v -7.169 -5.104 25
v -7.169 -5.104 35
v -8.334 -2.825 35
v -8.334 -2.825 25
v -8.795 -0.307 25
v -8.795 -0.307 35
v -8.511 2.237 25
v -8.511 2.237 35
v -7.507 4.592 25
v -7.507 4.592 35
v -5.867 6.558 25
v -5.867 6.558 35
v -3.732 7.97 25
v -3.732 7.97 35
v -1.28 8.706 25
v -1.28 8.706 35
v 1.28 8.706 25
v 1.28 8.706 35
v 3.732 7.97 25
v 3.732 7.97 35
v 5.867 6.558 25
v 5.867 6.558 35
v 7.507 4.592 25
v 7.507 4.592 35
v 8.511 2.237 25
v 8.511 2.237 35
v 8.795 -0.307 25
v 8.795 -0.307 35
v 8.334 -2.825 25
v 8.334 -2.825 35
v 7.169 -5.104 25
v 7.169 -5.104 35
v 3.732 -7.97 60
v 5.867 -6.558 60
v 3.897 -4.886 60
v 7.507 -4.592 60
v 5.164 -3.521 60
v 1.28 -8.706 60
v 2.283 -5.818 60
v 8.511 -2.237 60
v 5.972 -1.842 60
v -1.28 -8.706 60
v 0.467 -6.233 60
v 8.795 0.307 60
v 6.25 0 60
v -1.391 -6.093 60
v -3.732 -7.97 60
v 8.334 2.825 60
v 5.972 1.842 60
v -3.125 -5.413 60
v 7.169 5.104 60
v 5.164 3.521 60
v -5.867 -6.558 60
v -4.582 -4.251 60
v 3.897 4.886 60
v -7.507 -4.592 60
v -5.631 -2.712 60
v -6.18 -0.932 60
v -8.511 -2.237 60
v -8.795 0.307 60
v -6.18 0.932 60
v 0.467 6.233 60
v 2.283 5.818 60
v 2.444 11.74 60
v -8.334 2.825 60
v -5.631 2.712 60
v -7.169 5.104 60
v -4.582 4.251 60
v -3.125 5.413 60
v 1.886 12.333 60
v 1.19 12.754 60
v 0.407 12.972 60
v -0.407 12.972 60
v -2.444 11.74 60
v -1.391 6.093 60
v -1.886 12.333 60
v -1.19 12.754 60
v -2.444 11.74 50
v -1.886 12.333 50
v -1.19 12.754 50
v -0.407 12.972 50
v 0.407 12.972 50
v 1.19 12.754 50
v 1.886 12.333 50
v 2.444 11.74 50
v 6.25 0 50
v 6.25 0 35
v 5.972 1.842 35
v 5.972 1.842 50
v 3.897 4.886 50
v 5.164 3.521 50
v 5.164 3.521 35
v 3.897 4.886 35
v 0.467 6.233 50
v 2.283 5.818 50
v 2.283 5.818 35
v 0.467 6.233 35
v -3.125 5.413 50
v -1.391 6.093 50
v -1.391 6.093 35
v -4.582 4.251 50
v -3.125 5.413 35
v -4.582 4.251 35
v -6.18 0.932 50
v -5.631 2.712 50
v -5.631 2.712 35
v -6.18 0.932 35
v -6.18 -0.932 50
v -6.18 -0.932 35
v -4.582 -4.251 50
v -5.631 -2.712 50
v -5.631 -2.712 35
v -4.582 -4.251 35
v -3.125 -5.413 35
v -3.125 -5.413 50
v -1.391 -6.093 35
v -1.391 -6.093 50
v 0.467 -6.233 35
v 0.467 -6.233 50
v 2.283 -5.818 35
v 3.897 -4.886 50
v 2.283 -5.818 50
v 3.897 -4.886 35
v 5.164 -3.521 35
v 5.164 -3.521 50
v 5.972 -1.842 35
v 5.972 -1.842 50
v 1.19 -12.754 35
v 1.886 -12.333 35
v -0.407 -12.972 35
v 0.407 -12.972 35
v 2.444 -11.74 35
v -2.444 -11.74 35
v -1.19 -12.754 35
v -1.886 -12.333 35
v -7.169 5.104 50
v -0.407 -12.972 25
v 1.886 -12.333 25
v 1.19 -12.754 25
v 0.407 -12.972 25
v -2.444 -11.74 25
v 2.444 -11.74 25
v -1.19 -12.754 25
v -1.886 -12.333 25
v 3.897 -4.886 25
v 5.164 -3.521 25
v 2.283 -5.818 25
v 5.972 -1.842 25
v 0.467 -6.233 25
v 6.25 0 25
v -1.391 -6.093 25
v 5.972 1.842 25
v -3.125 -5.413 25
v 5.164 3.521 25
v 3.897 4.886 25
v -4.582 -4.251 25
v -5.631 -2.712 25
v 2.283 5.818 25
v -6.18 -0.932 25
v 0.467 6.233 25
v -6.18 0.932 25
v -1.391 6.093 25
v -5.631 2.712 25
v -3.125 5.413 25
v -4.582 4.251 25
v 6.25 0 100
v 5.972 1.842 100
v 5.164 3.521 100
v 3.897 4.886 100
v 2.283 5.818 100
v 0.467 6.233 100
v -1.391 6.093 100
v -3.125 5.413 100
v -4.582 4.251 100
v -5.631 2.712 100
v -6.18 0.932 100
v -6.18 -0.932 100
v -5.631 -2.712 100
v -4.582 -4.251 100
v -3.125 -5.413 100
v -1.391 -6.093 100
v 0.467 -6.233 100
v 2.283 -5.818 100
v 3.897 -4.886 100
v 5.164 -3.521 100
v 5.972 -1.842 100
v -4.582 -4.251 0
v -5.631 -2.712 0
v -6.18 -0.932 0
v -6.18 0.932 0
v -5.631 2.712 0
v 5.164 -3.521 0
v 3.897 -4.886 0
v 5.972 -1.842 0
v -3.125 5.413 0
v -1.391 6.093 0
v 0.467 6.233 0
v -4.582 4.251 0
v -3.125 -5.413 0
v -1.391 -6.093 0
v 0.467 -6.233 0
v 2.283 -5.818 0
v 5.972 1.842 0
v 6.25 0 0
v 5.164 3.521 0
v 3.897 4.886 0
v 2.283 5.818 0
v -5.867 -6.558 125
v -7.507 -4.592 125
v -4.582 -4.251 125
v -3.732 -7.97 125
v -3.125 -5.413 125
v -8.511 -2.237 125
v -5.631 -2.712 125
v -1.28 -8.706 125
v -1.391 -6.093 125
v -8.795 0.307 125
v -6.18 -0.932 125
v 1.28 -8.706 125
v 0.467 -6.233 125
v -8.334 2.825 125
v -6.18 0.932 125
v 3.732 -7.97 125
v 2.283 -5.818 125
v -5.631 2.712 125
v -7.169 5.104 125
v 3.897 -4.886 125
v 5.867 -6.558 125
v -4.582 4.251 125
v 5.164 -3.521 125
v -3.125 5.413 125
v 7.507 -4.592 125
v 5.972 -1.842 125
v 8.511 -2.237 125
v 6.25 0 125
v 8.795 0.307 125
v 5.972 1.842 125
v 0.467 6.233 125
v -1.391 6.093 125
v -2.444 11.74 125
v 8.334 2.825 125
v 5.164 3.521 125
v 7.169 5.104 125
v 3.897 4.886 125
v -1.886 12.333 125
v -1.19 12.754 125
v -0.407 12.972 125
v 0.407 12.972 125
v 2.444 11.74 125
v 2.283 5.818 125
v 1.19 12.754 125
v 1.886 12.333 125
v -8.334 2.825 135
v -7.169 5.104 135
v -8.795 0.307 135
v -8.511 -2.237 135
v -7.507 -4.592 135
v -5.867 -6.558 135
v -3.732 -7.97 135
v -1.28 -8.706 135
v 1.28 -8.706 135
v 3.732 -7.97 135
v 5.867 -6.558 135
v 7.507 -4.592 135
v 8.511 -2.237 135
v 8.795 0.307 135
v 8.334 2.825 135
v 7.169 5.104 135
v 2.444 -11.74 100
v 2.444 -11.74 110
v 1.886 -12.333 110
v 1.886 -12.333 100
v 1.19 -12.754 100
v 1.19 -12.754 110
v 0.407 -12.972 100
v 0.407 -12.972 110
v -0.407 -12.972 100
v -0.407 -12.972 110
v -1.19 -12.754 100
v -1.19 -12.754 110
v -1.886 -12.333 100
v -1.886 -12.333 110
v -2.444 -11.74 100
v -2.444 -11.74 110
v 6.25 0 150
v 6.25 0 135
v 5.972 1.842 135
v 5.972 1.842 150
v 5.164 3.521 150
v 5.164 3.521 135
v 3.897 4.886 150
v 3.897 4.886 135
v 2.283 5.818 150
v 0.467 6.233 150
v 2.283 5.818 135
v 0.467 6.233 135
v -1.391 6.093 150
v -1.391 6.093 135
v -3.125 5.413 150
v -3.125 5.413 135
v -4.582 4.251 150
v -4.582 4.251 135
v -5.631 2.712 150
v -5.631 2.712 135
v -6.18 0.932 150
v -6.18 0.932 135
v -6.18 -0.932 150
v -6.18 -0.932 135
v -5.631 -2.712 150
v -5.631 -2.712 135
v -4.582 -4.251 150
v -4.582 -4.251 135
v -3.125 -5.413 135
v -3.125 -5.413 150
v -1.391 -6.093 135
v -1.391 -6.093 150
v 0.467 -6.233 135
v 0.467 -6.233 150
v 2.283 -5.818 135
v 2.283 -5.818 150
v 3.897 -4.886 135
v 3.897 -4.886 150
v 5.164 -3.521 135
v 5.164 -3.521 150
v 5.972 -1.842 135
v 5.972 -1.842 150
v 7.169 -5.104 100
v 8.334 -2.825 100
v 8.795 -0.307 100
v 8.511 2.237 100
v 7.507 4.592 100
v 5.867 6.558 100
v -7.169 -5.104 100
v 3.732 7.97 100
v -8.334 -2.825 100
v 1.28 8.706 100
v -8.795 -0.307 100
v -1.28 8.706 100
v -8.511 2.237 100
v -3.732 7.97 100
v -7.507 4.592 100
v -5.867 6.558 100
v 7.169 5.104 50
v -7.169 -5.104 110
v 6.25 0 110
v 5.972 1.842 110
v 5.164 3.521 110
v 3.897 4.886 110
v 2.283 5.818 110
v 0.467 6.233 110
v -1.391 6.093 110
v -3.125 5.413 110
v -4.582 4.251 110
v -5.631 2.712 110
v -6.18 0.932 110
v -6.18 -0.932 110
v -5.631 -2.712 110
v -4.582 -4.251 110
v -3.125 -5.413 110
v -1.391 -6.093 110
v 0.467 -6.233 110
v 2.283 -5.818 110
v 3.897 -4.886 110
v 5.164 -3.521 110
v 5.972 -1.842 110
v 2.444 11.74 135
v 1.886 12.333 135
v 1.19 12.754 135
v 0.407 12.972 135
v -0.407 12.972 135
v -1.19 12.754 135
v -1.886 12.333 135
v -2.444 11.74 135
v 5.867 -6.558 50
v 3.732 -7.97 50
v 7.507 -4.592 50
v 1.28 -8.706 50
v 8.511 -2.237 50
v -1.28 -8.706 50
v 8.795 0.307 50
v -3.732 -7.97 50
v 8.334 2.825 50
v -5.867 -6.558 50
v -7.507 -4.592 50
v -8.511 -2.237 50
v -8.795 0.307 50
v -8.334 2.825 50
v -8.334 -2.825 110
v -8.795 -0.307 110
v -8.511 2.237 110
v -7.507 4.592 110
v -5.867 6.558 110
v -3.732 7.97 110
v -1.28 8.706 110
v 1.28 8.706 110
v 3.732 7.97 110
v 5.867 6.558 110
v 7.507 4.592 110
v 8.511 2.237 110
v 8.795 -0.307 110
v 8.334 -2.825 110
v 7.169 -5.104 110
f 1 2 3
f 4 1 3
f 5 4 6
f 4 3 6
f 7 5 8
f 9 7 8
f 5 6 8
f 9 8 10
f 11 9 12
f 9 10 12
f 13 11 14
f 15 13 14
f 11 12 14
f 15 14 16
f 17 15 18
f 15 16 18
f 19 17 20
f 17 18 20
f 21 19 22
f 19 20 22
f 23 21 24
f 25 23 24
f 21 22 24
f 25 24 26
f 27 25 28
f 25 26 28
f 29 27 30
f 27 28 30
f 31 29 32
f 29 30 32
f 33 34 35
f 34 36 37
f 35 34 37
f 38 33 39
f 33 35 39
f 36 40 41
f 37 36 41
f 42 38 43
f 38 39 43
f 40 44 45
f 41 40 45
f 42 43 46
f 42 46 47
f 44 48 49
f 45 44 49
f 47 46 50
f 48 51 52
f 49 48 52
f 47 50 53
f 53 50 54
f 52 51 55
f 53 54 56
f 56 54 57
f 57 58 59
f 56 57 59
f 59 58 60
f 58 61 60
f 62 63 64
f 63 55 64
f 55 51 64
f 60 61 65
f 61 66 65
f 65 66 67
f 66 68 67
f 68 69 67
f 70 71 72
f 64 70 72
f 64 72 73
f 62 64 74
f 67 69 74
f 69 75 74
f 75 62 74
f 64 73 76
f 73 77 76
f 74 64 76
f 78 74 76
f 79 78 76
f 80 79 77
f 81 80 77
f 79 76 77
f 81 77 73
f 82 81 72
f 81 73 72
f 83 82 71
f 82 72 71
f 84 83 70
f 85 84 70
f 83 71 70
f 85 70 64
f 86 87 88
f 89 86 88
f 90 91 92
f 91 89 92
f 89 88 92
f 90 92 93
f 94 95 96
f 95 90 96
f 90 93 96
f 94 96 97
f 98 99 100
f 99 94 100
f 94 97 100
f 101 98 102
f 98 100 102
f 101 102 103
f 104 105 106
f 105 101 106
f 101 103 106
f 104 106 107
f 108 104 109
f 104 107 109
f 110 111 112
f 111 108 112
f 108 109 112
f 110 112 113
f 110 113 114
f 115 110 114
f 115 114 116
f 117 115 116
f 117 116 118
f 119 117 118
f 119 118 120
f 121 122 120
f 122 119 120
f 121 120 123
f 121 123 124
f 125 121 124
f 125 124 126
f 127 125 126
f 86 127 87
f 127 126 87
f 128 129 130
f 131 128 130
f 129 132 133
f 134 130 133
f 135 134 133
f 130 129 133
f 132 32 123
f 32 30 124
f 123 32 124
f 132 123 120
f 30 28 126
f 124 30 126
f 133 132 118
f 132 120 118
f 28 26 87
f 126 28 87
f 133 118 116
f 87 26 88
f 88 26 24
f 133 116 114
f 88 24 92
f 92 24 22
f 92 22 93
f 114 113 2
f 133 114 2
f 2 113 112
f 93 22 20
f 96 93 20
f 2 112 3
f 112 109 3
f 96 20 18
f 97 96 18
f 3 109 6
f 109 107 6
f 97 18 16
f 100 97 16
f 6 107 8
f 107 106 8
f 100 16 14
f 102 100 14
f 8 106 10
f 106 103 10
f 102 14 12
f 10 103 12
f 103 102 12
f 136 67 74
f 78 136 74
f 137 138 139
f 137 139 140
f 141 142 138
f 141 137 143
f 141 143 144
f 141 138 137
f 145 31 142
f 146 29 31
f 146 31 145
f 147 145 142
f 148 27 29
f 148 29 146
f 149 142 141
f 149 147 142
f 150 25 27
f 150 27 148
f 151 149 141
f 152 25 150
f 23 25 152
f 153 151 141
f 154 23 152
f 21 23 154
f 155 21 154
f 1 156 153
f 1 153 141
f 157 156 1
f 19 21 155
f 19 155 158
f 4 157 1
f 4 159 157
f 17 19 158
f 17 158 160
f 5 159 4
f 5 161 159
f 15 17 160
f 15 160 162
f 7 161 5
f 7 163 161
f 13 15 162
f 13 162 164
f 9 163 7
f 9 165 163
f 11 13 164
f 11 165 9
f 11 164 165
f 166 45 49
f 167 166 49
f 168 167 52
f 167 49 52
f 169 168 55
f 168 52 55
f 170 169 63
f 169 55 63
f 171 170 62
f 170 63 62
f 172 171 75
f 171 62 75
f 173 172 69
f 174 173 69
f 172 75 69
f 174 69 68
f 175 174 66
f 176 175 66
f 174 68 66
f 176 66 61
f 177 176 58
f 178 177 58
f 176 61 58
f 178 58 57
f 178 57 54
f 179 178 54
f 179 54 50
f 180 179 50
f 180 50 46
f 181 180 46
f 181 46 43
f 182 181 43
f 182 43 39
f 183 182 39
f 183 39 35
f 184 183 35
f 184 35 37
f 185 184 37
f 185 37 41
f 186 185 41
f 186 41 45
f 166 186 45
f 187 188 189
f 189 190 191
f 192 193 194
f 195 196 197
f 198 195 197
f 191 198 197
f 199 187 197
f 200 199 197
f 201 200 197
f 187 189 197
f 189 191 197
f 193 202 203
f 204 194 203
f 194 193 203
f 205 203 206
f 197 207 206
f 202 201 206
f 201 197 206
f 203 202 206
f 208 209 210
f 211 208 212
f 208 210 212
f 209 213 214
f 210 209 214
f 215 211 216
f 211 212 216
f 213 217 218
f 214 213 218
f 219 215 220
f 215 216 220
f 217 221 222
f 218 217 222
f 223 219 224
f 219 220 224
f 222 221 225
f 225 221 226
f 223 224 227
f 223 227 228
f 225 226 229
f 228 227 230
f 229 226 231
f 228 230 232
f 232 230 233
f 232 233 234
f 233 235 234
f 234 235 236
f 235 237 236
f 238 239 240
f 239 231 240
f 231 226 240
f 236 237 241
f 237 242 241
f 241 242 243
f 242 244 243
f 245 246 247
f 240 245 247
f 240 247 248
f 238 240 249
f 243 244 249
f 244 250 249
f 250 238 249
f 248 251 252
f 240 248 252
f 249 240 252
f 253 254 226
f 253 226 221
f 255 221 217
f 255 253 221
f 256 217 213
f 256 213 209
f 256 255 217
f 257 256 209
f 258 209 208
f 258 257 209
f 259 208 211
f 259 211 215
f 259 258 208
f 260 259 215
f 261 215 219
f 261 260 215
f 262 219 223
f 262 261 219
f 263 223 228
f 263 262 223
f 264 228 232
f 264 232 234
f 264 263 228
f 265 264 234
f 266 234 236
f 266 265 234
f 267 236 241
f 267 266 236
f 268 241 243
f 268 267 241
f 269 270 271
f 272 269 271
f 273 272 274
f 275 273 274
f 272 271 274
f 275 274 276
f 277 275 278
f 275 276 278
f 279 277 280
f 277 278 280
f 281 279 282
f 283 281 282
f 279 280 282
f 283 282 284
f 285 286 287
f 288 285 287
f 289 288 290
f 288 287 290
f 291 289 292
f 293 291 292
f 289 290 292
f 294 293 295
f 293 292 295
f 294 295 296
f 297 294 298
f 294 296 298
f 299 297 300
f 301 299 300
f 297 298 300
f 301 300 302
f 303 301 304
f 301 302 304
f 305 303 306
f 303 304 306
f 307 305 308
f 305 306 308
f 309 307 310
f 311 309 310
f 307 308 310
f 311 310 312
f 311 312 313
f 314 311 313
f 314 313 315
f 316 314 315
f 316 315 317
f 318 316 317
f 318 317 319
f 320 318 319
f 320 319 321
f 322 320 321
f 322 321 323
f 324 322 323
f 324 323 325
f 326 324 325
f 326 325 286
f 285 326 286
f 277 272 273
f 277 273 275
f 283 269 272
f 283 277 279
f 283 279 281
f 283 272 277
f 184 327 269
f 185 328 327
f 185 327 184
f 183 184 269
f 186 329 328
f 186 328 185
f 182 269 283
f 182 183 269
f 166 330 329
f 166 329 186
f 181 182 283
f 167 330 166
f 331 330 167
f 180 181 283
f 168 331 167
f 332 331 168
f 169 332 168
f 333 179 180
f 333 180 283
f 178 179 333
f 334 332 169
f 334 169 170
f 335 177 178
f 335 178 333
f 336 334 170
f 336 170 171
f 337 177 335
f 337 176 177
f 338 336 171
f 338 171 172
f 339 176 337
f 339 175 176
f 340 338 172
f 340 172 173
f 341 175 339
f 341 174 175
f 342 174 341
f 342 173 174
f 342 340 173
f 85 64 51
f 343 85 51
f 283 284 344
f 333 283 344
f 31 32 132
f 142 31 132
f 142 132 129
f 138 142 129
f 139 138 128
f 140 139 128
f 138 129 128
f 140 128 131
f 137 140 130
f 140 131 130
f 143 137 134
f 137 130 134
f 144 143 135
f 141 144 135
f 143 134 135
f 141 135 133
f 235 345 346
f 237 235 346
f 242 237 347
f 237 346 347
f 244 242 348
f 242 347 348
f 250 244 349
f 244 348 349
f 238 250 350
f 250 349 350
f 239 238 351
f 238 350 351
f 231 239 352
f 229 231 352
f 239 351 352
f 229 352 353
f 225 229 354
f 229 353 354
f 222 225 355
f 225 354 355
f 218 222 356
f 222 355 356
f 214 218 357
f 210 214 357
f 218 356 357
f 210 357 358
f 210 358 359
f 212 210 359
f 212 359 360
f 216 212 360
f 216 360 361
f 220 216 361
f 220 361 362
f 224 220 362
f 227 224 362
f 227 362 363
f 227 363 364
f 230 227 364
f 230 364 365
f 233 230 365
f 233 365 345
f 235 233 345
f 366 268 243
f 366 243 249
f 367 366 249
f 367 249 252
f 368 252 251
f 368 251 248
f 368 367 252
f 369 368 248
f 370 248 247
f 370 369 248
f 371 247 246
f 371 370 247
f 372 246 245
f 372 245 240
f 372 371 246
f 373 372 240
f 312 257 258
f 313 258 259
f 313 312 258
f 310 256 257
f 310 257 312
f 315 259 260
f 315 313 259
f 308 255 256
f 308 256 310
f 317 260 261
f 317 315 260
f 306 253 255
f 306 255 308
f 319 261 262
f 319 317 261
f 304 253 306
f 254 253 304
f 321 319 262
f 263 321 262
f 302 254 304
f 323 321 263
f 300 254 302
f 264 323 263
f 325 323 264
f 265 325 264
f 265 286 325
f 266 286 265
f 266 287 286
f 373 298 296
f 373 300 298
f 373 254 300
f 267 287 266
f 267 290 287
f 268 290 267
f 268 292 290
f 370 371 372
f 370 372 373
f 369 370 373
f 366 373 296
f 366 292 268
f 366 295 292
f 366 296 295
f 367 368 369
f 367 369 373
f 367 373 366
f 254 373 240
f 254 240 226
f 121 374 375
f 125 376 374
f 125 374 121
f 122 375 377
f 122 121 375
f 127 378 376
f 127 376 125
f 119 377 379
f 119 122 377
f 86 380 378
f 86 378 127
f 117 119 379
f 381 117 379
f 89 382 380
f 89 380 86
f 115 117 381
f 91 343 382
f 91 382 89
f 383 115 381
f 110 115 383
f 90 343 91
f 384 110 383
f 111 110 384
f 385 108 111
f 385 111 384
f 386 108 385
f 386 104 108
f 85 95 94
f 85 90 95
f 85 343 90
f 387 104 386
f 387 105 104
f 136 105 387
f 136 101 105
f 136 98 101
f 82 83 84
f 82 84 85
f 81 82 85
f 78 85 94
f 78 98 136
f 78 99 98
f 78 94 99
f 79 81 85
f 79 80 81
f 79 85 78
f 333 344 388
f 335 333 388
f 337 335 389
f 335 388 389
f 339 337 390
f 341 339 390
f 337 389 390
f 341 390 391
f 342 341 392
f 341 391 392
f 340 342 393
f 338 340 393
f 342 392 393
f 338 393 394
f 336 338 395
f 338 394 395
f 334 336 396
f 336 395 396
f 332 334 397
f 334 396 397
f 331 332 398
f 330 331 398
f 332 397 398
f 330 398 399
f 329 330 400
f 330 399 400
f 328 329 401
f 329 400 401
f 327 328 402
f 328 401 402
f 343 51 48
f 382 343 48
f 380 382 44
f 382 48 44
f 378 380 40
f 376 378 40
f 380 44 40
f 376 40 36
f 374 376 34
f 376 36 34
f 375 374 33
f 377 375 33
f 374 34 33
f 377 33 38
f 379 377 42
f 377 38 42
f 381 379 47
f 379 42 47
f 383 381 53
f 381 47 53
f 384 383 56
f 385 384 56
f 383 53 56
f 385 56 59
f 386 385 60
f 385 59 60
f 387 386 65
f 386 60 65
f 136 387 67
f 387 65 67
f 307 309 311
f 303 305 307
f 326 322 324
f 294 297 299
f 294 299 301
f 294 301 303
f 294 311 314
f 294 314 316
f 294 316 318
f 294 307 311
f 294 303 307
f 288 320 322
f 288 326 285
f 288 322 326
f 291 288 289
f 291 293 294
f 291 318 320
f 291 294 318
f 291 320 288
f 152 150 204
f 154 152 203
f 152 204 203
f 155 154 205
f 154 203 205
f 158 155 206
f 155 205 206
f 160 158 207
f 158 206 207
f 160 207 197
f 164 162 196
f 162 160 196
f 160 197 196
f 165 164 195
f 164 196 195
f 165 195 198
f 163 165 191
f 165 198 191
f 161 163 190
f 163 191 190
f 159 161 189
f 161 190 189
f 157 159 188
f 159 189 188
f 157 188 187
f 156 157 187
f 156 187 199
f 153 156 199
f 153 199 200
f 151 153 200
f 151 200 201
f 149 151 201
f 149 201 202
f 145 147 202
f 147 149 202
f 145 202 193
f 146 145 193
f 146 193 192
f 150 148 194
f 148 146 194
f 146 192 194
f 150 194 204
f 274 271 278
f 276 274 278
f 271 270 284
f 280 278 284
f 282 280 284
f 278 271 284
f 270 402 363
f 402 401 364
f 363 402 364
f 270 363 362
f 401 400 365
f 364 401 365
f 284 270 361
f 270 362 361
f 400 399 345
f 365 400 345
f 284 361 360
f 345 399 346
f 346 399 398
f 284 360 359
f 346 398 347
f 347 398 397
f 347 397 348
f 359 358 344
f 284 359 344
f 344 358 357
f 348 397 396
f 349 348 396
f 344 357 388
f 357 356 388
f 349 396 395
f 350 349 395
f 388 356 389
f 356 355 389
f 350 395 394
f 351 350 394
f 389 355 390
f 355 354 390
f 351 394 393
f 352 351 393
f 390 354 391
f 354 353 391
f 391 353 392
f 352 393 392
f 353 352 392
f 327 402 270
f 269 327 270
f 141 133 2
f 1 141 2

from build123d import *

# Parameters (mm, degrees)
SKETCH1_R           = 6.25
BOSS_EXTRUDE1_DEPTH = 150
SKETCH2_R           = 6.25
BOSS_EXTRUDE2_DEPTH = 10
SKETCH3_R           = 6.25
BOSS_EXTRUDE3_DEPTH = 10
BOSS_EXTRUDE4_DEPTH = 10
BOSS_EXTRUDE5_DEPTH = 10


with BuildPart() as part:
    # Sketch1 → Boss-Extrude1 (new body)
    with BuildSketch(Plane.XY):
        Circle(SKETCH1_R)
    extrude(amount=BOSS_EXTRUDE1_DEPTH)

    # Sketch2 → Boss-Extrude2 (add)
    with BuildSketch(Plane.XY.offset(135)):
        with BuildLine():
            Line((-2.443849423, 11.74), (-7.168624973, 5.104))
            ThreePointArc((-7.168624973, 5.104), (0, -8.8), (7.168624973, 5.104))
            Line((7.168624973, 5.104), (2.443849423, 11.74))
            ThreePointArc((2.443849423, 11.74), (0, 13), (-2.443849423, 11.74))
        make_face()
        Circle(SKETCH2_R, mode=Mode.SUBTRACT)
    extrude(amount=-BOSS_EXTRUDE2_DEPTH)

    # Sketch3 → Boss-Extrude3 (add)
    with BuildSketch(Plane(origin=(0, 0, 110), x_dir=(-1, 0, 0), z_dir=(0, 0, -1))):
        with BuildLine():
            Line((2.443849423, -11.74), (7.168624973, -5.104))
            ThreePointArc((7.168624973, -5.104), (0, 8.8), (-7.168624973, -5.104))
            Line((-7.168624973, -5.104), (-2.443849423, -11.74))
            ThreePointArc((-2.443849423, -11.74), (0, -13), (2.443849423, -11.74))
        make_face()
        Circle(SKETCH3_R, mode=Mode.SUBTRACT)
    extrude(amount=BOSS_EXTRUDE3_DEPTH)

    # Sketch4 → Boss-Extrude4 (add)
    with BuildSketch(Plane(origin=(0, 0, 60), x_dir=(-1, 0, 0), z_dir=(0, 0, -1))):
        with BuildLine():
            Line((-2.443849423, 11.74), (-7.168624973, 5.104))
            ThreePointArc((-7.168624973, 5.104), (0, -8.8), (7.168624973, 5.104))
            Line((7.168624973, 5.104), (2.443849423, 11.74))
            ThreePointArc((2.443849423, 11.74), (0, 13), (-2.443849423, 11.74))
        make_face()
    extrude(amount=BOSS_EXTRUDE4_DEPTH)

    # Sketch5 → Boss-Extrude5 (add)
    with BuildSketch(Plane(origin=(0, 0, 35), x_dir=(-1, 0, 0), z_dir=(0, 0, -1))):
        with BuildLine():
            Line((2.443849423, -11.74), (7.168624973, -5.104))
            ThreePointArc((7.168624973, -5.104), (0, 8.8), (-7.168624973, -5.104))
            Line((-7.168624973, -5.104), (-2.443849423, -11.74))
            ThreePointArc((-2.443849423, -11.74), (0, -13), (2.443849423, -11.74))
        make_face()
    extrude(amount=BOSS_EXTRUDE5_DEPTH)


solid = part.part
